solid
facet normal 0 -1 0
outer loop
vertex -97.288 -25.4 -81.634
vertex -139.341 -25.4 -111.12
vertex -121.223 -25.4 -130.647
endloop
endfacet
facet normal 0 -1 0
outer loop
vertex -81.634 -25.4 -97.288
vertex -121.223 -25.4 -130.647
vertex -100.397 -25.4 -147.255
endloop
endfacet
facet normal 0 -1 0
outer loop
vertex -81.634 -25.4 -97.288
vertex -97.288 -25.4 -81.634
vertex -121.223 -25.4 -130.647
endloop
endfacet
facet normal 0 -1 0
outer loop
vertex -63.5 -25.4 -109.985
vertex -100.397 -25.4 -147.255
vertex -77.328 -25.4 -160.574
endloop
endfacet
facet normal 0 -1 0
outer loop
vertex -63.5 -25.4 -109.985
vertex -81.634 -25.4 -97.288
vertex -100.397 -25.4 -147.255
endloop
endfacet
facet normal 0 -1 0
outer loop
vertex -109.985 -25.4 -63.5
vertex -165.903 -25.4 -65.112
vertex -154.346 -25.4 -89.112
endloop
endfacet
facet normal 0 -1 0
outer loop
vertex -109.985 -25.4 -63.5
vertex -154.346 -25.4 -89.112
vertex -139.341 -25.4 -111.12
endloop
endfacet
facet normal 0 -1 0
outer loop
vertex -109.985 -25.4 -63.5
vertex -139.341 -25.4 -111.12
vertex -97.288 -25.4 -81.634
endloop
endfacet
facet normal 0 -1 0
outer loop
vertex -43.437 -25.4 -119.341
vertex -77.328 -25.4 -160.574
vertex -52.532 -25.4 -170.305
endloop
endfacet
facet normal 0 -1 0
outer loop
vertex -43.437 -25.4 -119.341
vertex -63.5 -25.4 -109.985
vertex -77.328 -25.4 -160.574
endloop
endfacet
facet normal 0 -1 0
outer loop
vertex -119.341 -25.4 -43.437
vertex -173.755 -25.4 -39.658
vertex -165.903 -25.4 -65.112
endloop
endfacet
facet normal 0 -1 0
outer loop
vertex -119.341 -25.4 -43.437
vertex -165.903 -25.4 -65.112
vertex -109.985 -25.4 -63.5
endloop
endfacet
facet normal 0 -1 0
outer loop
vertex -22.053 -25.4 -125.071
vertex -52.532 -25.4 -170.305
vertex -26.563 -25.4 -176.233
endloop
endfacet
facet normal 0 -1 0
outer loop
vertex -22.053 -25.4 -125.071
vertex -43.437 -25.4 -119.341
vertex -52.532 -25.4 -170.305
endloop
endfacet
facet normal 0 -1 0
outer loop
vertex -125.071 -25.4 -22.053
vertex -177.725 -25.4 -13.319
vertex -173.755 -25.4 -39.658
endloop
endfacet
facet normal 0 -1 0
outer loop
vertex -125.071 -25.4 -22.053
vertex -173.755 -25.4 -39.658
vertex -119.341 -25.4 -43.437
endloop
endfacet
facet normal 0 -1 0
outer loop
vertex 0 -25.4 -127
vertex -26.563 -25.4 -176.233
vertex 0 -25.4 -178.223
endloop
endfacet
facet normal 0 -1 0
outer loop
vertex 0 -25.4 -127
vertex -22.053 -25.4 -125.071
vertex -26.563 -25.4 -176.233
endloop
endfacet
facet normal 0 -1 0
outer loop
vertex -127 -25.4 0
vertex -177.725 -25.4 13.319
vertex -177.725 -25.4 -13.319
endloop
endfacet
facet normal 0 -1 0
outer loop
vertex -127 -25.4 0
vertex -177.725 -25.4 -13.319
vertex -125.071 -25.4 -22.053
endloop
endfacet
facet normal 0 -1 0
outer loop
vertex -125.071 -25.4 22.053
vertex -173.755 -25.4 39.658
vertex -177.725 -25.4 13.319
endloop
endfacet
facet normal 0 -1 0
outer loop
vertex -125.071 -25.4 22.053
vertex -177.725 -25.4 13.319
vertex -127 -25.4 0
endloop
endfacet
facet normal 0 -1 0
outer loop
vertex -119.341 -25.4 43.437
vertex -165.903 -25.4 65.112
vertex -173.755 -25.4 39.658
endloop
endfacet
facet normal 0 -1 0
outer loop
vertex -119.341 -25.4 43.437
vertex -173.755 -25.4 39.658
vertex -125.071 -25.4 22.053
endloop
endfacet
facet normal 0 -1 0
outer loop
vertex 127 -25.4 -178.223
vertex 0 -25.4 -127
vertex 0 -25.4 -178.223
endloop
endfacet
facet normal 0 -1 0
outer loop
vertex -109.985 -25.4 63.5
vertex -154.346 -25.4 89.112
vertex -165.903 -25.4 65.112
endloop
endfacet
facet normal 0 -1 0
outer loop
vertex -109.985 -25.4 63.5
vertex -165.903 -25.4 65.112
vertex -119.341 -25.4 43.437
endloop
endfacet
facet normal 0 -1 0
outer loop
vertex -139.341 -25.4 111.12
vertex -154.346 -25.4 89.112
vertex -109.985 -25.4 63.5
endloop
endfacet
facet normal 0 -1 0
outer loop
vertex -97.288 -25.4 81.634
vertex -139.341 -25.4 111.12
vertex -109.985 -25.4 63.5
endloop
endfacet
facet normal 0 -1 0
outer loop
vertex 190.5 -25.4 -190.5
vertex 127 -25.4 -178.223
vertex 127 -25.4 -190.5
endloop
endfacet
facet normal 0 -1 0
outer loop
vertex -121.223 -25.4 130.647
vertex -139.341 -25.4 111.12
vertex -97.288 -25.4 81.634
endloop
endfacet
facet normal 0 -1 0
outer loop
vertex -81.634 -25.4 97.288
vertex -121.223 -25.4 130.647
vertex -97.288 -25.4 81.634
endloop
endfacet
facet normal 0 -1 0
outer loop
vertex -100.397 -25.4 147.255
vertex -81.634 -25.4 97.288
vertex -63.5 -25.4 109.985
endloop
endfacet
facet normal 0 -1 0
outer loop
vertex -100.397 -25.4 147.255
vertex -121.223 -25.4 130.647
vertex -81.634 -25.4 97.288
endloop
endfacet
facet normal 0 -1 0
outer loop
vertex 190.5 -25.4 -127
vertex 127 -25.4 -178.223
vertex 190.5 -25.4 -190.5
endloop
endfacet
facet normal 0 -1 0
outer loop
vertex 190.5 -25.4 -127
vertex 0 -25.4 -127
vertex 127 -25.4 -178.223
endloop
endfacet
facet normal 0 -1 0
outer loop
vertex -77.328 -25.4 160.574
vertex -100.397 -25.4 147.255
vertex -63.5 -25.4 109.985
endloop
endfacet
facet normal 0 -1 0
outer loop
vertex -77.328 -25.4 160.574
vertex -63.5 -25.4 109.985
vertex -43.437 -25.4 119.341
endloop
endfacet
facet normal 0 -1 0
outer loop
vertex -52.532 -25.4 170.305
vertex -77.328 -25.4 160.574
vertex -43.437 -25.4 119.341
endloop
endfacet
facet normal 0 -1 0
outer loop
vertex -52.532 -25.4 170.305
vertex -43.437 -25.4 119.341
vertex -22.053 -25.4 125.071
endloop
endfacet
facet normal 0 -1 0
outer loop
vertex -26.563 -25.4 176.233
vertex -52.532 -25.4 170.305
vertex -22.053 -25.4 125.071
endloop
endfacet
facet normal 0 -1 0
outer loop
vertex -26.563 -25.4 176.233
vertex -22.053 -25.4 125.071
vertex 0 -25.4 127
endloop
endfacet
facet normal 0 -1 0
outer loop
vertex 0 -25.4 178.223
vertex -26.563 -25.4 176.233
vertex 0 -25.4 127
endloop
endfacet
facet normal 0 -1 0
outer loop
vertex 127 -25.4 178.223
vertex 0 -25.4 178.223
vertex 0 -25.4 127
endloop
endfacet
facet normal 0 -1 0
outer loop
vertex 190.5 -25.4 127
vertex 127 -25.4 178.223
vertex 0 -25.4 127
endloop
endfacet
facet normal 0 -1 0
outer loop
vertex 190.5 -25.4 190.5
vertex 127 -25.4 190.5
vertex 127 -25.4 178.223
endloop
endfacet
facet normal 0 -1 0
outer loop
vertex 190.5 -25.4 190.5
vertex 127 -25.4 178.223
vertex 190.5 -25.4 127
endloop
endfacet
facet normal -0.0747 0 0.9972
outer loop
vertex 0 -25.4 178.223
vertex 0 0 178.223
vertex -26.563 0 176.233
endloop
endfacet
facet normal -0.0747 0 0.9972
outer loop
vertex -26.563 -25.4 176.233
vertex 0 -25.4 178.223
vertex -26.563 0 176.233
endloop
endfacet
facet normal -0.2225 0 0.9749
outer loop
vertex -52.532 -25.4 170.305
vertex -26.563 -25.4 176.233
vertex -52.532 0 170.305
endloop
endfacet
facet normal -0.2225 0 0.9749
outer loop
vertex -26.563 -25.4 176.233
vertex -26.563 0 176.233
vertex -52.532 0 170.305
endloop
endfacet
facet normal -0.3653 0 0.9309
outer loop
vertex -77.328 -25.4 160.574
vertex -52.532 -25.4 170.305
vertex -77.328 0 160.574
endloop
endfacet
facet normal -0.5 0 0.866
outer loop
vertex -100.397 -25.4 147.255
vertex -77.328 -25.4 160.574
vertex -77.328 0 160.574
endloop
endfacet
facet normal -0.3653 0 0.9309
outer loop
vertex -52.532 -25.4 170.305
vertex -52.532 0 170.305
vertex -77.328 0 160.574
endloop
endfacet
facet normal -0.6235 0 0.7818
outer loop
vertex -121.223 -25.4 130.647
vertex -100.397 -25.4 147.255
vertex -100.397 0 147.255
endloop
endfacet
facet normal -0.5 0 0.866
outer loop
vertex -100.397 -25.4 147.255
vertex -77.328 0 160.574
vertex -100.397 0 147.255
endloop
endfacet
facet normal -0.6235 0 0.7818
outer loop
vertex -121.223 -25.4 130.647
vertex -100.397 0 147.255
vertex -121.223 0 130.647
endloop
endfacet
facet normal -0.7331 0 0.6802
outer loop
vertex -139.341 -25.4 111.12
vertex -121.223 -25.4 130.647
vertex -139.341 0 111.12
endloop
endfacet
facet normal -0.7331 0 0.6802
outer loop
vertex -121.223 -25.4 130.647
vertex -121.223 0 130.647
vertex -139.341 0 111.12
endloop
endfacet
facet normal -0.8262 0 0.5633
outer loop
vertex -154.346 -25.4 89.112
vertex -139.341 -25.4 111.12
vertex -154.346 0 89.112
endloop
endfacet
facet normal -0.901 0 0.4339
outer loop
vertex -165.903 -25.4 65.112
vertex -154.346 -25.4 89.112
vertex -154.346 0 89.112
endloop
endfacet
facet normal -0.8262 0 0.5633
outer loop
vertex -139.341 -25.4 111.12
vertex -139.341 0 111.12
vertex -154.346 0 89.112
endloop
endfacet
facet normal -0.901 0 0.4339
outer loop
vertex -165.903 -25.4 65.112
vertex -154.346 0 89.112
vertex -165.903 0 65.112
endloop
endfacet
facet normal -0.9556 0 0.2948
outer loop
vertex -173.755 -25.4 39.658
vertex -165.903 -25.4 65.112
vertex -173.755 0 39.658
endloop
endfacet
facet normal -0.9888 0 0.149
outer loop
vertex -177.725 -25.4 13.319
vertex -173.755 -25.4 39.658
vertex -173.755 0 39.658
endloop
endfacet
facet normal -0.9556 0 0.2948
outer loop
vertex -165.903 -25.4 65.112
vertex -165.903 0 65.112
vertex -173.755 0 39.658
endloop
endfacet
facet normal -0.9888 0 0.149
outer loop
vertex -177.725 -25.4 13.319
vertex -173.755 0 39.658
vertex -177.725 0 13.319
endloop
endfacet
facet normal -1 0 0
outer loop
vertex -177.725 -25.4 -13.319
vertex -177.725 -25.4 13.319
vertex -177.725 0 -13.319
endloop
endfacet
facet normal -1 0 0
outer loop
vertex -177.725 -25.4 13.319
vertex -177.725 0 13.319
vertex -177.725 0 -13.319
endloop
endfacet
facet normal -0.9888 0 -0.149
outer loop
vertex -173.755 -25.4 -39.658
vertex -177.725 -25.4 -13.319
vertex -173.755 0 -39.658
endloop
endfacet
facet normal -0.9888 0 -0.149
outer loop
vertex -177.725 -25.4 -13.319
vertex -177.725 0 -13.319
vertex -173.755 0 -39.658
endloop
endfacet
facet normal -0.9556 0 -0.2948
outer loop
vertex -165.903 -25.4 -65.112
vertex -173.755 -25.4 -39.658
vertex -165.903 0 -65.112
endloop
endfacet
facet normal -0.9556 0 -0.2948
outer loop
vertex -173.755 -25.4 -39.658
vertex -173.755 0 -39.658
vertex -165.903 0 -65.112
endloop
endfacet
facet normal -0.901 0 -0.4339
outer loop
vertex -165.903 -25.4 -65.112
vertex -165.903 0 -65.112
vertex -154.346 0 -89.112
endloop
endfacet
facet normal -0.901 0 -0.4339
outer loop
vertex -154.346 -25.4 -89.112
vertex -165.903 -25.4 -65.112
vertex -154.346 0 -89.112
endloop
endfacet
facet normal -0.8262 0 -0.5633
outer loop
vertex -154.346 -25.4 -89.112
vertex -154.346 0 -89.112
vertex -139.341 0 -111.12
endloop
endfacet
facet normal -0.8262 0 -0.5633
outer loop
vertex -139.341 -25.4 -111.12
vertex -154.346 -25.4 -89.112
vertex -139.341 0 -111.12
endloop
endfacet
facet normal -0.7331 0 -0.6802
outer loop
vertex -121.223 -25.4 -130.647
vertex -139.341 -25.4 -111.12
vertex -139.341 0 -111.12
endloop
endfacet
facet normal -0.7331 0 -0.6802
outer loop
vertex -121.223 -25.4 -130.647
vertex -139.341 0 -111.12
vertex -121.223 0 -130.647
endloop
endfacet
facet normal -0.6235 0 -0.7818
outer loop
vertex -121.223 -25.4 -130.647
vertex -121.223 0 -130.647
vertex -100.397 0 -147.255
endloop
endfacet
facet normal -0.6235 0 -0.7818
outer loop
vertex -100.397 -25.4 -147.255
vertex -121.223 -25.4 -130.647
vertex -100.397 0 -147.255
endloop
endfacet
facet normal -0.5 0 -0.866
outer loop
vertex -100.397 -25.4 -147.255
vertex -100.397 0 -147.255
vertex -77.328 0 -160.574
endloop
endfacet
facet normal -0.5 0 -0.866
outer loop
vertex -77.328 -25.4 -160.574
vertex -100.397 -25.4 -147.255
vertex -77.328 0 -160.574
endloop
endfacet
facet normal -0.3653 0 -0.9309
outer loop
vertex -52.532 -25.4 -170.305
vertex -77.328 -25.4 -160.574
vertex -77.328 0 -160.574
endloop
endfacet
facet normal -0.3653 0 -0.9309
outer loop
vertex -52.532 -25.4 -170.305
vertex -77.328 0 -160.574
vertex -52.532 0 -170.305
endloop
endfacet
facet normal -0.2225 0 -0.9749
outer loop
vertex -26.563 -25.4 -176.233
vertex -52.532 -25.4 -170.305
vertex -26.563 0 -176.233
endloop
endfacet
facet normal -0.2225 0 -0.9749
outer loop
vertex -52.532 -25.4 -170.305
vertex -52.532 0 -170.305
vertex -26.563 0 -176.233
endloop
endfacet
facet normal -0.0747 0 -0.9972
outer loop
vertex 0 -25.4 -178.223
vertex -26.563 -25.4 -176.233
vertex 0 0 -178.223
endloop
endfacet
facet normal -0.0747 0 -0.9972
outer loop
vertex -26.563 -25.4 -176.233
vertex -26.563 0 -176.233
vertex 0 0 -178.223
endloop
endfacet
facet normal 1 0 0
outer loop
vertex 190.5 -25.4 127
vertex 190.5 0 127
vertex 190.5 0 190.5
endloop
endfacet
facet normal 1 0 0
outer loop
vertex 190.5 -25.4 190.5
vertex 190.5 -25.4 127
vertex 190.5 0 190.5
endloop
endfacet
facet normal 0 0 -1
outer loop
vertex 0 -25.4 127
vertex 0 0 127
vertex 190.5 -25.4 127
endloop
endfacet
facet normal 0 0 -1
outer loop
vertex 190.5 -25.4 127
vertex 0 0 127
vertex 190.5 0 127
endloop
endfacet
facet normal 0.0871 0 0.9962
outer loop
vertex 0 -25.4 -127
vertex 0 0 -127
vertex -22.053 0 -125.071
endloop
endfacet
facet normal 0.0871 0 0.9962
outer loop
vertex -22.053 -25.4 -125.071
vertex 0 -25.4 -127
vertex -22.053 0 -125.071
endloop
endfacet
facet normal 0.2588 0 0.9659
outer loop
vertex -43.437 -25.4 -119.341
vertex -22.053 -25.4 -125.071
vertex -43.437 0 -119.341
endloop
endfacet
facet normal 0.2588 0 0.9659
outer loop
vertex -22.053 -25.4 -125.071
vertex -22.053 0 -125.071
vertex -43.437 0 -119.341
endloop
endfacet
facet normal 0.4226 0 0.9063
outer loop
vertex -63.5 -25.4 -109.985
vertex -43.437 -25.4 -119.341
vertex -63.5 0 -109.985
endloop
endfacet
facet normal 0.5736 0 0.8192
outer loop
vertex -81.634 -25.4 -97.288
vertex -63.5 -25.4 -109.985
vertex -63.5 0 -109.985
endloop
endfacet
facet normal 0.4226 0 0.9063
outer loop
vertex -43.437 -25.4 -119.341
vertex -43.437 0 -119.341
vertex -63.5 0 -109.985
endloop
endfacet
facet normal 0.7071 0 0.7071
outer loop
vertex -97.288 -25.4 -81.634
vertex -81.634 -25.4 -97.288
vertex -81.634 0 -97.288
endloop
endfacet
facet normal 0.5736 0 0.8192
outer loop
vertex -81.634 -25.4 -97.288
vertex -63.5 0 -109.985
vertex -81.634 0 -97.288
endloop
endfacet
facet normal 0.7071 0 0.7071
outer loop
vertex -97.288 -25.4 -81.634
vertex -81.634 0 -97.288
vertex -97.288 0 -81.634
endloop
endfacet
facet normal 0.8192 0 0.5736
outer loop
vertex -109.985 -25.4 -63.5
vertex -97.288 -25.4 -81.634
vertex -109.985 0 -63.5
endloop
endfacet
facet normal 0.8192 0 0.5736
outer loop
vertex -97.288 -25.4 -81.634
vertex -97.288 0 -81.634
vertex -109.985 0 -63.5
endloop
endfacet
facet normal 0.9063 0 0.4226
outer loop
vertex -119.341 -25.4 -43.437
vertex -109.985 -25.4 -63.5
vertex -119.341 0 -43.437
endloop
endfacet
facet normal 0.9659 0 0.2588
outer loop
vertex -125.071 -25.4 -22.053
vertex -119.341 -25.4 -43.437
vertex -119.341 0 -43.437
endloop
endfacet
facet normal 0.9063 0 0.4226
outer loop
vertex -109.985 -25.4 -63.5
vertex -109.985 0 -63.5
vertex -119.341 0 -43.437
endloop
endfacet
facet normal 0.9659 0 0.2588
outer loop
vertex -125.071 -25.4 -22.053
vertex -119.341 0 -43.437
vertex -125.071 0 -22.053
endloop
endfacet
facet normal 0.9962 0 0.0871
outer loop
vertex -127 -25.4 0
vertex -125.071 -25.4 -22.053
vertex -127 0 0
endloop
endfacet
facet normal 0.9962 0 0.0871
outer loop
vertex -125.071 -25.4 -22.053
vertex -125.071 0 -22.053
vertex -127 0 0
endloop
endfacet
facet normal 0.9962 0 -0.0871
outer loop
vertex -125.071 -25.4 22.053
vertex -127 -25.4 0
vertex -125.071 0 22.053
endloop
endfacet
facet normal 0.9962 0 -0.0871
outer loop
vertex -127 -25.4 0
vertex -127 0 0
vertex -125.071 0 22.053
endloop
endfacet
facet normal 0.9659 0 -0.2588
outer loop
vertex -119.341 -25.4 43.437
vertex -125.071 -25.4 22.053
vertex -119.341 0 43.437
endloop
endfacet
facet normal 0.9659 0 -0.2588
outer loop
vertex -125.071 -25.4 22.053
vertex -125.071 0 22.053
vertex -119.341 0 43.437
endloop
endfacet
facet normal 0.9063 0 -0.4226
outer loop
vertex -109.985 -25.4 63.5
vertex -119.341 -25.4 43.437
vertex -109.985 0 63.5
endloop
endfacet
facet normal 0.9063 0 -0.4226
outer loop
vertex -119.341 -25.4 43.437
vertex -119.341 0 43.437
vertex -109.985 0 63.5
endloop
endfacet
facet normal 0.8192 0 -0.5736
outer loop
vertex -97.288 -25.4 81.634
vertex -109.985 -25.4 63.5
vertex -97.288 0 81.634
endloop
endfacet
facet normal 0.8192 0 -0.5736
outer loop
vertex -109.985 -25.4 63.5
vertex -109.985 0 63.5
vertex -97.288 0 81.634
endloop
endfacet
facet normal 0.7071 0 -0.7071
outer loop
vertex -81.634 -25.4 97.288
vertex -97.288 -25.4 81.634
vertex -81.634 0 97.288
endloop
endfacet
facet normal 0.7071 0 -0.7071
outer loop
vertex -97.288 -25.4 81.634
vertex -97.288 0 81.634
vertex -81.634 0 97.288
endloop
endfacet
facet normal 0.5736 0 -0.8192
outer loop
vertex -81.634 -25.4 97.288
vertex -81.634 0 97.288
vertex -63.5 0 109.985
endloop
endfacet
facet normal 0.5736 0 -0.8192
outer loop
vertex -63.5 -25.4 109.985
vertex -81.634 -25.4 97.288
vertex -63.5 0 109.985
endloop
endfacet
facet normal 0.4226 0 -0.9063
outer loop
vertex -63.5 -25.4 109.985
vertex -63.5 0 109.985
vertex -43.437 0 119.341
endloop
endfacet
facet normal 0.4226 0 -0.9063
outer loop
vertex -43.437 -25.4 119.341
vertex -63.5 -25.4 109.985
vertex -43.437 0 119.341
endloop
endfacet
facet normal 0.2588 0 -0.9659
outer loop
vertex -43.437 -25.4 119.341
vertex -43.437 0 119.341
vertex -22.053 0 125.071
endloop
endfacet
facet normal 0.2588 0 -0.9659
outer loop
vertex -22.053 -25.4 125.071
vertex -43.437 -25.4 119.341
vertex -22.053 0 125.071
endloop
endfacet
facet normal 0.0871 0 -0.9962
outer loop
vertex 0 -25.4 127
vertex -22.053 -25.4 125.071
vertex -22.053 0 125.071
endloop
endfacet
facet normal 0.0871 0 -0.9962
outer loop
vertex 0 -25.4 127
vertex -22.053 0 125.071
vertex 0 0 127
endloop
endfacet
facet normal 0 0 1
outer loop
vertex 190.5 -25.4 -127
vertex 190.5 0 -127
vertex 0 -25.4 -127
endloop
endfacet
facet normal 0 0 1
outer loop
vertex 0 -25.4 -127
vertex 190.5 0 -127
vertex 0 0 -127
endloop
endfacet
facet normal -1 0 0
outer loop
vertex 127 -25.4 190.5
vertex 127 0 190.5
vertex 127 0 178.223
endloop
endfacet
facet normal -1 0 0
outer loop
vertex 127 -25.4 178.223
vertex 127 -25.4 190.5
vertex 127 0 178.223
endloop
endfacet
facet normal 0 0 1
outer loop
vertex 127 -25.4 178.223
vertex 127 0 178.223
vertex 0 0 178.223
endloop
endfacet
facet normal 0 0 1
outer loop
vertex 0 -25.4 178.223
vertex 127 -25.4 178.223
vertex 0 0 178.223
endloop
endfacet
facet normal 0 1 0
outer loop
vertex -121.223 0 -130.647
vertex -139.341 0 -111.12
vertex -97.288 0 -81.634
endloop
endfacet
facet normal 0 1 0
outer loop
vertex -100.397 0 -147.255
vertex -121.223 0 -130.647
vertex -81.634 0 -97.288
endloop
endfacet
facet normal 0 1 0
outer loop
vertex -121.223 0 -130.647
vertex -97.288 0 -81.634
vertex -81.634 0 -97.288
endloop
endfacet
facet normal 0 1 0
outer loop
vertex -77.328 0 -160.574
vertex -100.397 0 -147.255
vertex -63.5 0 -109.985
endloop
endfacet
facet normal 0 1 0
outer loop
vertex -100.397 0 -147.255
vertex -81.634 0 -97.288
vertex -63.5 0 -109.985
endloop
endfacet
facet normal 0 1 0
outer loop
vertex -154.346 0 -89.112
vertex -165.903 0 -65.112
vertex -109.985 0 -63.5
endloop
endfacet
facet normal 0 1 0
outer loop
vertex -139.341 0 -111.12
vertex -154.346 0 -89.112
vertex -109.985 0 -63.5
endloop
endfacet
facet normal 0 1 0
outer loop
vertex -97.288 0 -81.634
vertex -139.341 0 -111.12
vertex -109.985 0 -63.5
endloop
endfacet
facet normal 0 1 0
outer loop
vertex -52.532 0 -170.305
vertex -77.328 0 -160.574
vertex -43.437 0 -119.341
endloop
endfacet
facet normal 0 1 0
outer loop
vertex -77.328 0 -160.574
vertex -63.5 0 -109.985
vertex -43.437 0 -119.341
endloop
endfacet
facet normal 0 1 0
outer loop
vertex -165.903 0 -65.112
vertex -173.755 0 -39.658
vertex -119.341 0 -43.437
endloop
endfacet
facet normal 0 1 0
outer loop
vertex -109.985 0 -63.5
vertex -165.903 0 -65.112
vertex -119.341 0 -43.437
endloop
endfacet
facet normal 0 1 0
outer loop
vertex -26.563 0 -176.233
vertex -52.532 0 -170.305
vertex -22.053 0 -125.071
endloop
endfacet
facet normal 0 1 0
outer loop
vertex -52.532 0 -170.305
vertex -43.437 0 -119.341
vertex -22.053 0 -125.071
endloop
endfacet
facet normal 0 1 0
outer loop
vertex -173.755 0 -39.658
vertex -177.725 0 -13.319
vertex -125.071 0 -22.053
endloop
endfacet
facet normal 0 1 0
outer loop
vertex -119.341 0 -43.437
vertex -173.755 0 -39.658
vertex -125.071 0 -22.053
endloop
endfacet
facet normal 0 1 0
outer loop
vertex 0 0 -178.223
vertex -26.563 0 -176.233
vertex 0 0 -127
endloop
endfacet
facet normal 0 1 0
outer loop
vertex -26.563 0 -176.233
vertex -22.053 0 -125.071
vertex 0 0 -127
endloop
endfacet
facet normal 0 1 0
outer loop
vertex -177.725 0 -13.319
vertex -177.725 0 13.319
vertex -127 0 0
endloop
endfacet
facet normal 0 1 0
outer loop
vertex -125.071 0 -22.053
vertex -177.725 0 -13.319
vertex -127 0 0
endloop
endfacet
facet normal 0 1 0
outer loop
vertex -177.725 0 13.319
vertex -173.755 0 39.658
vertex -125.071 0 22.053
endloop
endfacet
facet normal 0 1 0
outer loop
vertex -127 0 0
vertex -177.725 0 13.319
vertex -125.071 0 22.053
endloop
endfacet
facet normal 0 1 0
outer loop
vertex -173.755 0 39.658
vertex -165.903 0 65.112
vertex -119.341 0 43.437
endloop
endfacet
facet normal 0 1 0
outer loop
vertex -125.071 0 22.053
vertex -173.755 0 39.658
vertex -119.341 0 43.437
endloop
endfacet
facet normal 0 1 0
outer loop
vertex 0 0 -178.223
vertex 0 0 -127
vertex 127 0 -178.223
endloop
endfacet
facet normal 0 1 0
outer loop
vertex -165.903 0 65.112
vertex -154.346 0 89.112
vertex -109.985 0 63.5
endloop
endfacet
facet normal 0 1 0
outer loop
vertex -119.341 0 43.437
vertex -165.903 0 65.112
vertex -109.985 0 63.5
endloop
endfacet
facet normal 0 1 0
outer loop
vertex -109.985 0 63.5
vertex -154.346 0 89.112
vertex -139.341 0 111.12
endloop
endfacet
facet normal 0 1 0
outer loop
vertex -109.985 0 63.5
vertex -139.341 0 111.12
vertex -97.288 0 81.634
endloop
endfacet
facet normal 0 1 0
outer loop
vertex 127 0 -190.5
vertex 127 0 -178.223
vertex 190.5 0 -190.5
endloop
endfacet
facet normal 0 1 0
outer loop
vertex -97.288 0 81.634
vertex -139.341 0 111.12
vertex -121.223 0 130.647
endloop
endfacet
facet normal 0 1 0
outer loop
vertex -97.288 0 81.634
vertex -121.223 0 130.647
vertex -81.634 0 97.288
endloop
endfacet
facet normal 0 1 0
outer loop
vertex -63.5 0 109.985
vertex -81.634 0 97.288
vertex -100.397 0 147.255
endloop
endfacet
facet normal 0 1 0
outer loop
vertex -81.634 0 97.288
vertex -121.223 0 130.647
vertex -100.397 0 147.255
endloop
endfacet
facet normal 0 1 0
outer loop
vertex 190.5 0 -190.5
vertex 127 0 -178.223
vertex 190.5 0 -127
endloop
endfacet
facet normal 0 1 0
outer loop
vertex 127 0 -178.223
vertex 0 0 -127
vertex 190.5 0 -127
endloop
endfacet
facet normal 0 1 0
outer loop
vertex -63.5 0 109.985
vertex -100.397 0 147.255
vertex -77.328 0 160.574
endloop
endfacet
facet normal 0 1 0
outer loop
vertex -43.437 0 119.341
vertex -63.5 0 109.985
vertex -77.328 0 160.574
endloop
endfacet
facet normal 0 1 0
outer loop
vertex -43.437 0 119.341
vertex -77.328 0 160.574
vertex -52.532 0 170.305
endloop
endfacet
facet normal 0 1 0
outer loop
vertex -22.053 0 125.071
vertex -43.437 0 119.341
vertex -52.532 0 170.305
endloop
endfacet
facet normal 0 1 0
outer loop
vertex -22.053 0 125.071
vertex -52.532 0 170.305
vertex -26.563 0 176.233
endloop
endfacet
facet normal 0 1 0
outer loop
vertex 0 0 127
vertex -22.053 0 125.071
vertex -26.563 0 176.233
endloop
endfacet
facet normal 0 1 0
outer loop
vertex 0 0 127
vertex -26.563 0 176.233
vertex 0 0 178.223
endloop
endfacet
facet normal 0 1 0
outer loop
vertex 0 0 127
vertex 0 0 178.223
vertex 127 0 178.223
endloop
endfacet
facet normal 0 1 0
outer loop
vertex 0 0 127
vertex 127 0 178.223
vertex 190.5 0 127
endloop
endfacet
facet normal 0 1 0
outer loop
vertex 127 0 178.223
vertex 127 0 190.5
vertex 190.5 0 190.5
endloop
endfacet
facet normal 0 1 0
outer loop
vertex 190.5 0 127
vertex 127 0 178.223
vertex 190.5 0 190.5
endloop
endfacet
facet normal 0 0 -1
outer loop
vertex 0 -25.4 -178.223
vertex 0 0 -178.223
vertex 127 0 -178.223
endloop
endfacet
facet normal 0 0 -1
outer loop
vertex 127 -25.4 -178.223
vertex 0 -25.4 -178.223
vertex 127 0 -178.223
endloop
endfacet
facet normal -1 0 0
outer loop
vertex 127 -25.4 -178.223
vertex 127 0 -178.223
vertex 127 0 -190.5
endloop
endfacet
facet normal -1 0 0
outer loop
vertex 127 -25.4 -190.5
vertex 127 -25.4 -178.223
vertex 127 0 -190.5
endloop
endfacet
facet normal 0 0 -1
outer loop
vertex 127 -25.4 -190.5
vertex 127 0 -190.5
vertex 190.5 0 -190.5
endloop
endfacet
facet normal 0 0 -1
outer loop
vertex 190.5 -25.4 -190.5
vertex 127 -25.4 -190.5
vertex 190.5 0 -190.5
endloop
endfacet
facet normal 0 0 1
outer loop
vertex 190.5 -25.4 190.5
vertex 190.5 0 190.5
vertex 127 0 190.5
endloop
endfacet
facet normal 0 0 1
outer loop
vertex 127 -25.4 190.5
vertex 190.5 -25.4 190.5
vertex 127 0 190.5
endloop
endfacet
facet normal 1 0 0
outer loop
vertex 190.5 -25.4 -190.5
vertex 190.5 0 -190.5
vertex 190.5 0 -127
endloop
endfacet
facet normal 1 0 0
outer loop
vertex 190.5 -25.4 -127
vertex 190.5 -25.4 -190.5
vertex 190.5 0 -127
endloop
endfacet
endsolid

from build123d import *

# Parameters (mm, degrees)
F1_DEPTH = 25.4


with BuildPart() as f1:
    # F0 (on Front) → F1 (new body)
    with BuildSketch(Plane.XZ):
        with BuildLine():
            Line((127, 190.5), (127, 178.223333))
            Line((127, 178.223333), (0, 178.223333))
            ThreePointArc((0, 178.223333), (-178.223333, 0), (0, -178.223333))
            Line((0, -178.223333), (127, -178.223333))
            Line((127, -178.223333), (127, -190.5))
            Line((127, -190.5), (190.5, -190.5))
            Line((190.5, -190.5), (190.5, -178.223333))
            Line((190.5, -178.223333), (190.5, -127))
            Line((190.5, -127), (127, -127))
            Line((127, -127), (0, -127))
            ThreePointArc((0, -127), (-127, 0), (0, 127))
            Line((0, 127), (127, 127))
            Line((127, 127), (190.5, 127))
            Line((190.5, 127), (190.5, 178.223333))
            Line((190.5, 178.223333), (190.5, 190.5))
            Line((190.5, 190.5), (127, 190.5))
        make_face()
    extrude(amount=F1_DEPTH)


solid = f1.part
